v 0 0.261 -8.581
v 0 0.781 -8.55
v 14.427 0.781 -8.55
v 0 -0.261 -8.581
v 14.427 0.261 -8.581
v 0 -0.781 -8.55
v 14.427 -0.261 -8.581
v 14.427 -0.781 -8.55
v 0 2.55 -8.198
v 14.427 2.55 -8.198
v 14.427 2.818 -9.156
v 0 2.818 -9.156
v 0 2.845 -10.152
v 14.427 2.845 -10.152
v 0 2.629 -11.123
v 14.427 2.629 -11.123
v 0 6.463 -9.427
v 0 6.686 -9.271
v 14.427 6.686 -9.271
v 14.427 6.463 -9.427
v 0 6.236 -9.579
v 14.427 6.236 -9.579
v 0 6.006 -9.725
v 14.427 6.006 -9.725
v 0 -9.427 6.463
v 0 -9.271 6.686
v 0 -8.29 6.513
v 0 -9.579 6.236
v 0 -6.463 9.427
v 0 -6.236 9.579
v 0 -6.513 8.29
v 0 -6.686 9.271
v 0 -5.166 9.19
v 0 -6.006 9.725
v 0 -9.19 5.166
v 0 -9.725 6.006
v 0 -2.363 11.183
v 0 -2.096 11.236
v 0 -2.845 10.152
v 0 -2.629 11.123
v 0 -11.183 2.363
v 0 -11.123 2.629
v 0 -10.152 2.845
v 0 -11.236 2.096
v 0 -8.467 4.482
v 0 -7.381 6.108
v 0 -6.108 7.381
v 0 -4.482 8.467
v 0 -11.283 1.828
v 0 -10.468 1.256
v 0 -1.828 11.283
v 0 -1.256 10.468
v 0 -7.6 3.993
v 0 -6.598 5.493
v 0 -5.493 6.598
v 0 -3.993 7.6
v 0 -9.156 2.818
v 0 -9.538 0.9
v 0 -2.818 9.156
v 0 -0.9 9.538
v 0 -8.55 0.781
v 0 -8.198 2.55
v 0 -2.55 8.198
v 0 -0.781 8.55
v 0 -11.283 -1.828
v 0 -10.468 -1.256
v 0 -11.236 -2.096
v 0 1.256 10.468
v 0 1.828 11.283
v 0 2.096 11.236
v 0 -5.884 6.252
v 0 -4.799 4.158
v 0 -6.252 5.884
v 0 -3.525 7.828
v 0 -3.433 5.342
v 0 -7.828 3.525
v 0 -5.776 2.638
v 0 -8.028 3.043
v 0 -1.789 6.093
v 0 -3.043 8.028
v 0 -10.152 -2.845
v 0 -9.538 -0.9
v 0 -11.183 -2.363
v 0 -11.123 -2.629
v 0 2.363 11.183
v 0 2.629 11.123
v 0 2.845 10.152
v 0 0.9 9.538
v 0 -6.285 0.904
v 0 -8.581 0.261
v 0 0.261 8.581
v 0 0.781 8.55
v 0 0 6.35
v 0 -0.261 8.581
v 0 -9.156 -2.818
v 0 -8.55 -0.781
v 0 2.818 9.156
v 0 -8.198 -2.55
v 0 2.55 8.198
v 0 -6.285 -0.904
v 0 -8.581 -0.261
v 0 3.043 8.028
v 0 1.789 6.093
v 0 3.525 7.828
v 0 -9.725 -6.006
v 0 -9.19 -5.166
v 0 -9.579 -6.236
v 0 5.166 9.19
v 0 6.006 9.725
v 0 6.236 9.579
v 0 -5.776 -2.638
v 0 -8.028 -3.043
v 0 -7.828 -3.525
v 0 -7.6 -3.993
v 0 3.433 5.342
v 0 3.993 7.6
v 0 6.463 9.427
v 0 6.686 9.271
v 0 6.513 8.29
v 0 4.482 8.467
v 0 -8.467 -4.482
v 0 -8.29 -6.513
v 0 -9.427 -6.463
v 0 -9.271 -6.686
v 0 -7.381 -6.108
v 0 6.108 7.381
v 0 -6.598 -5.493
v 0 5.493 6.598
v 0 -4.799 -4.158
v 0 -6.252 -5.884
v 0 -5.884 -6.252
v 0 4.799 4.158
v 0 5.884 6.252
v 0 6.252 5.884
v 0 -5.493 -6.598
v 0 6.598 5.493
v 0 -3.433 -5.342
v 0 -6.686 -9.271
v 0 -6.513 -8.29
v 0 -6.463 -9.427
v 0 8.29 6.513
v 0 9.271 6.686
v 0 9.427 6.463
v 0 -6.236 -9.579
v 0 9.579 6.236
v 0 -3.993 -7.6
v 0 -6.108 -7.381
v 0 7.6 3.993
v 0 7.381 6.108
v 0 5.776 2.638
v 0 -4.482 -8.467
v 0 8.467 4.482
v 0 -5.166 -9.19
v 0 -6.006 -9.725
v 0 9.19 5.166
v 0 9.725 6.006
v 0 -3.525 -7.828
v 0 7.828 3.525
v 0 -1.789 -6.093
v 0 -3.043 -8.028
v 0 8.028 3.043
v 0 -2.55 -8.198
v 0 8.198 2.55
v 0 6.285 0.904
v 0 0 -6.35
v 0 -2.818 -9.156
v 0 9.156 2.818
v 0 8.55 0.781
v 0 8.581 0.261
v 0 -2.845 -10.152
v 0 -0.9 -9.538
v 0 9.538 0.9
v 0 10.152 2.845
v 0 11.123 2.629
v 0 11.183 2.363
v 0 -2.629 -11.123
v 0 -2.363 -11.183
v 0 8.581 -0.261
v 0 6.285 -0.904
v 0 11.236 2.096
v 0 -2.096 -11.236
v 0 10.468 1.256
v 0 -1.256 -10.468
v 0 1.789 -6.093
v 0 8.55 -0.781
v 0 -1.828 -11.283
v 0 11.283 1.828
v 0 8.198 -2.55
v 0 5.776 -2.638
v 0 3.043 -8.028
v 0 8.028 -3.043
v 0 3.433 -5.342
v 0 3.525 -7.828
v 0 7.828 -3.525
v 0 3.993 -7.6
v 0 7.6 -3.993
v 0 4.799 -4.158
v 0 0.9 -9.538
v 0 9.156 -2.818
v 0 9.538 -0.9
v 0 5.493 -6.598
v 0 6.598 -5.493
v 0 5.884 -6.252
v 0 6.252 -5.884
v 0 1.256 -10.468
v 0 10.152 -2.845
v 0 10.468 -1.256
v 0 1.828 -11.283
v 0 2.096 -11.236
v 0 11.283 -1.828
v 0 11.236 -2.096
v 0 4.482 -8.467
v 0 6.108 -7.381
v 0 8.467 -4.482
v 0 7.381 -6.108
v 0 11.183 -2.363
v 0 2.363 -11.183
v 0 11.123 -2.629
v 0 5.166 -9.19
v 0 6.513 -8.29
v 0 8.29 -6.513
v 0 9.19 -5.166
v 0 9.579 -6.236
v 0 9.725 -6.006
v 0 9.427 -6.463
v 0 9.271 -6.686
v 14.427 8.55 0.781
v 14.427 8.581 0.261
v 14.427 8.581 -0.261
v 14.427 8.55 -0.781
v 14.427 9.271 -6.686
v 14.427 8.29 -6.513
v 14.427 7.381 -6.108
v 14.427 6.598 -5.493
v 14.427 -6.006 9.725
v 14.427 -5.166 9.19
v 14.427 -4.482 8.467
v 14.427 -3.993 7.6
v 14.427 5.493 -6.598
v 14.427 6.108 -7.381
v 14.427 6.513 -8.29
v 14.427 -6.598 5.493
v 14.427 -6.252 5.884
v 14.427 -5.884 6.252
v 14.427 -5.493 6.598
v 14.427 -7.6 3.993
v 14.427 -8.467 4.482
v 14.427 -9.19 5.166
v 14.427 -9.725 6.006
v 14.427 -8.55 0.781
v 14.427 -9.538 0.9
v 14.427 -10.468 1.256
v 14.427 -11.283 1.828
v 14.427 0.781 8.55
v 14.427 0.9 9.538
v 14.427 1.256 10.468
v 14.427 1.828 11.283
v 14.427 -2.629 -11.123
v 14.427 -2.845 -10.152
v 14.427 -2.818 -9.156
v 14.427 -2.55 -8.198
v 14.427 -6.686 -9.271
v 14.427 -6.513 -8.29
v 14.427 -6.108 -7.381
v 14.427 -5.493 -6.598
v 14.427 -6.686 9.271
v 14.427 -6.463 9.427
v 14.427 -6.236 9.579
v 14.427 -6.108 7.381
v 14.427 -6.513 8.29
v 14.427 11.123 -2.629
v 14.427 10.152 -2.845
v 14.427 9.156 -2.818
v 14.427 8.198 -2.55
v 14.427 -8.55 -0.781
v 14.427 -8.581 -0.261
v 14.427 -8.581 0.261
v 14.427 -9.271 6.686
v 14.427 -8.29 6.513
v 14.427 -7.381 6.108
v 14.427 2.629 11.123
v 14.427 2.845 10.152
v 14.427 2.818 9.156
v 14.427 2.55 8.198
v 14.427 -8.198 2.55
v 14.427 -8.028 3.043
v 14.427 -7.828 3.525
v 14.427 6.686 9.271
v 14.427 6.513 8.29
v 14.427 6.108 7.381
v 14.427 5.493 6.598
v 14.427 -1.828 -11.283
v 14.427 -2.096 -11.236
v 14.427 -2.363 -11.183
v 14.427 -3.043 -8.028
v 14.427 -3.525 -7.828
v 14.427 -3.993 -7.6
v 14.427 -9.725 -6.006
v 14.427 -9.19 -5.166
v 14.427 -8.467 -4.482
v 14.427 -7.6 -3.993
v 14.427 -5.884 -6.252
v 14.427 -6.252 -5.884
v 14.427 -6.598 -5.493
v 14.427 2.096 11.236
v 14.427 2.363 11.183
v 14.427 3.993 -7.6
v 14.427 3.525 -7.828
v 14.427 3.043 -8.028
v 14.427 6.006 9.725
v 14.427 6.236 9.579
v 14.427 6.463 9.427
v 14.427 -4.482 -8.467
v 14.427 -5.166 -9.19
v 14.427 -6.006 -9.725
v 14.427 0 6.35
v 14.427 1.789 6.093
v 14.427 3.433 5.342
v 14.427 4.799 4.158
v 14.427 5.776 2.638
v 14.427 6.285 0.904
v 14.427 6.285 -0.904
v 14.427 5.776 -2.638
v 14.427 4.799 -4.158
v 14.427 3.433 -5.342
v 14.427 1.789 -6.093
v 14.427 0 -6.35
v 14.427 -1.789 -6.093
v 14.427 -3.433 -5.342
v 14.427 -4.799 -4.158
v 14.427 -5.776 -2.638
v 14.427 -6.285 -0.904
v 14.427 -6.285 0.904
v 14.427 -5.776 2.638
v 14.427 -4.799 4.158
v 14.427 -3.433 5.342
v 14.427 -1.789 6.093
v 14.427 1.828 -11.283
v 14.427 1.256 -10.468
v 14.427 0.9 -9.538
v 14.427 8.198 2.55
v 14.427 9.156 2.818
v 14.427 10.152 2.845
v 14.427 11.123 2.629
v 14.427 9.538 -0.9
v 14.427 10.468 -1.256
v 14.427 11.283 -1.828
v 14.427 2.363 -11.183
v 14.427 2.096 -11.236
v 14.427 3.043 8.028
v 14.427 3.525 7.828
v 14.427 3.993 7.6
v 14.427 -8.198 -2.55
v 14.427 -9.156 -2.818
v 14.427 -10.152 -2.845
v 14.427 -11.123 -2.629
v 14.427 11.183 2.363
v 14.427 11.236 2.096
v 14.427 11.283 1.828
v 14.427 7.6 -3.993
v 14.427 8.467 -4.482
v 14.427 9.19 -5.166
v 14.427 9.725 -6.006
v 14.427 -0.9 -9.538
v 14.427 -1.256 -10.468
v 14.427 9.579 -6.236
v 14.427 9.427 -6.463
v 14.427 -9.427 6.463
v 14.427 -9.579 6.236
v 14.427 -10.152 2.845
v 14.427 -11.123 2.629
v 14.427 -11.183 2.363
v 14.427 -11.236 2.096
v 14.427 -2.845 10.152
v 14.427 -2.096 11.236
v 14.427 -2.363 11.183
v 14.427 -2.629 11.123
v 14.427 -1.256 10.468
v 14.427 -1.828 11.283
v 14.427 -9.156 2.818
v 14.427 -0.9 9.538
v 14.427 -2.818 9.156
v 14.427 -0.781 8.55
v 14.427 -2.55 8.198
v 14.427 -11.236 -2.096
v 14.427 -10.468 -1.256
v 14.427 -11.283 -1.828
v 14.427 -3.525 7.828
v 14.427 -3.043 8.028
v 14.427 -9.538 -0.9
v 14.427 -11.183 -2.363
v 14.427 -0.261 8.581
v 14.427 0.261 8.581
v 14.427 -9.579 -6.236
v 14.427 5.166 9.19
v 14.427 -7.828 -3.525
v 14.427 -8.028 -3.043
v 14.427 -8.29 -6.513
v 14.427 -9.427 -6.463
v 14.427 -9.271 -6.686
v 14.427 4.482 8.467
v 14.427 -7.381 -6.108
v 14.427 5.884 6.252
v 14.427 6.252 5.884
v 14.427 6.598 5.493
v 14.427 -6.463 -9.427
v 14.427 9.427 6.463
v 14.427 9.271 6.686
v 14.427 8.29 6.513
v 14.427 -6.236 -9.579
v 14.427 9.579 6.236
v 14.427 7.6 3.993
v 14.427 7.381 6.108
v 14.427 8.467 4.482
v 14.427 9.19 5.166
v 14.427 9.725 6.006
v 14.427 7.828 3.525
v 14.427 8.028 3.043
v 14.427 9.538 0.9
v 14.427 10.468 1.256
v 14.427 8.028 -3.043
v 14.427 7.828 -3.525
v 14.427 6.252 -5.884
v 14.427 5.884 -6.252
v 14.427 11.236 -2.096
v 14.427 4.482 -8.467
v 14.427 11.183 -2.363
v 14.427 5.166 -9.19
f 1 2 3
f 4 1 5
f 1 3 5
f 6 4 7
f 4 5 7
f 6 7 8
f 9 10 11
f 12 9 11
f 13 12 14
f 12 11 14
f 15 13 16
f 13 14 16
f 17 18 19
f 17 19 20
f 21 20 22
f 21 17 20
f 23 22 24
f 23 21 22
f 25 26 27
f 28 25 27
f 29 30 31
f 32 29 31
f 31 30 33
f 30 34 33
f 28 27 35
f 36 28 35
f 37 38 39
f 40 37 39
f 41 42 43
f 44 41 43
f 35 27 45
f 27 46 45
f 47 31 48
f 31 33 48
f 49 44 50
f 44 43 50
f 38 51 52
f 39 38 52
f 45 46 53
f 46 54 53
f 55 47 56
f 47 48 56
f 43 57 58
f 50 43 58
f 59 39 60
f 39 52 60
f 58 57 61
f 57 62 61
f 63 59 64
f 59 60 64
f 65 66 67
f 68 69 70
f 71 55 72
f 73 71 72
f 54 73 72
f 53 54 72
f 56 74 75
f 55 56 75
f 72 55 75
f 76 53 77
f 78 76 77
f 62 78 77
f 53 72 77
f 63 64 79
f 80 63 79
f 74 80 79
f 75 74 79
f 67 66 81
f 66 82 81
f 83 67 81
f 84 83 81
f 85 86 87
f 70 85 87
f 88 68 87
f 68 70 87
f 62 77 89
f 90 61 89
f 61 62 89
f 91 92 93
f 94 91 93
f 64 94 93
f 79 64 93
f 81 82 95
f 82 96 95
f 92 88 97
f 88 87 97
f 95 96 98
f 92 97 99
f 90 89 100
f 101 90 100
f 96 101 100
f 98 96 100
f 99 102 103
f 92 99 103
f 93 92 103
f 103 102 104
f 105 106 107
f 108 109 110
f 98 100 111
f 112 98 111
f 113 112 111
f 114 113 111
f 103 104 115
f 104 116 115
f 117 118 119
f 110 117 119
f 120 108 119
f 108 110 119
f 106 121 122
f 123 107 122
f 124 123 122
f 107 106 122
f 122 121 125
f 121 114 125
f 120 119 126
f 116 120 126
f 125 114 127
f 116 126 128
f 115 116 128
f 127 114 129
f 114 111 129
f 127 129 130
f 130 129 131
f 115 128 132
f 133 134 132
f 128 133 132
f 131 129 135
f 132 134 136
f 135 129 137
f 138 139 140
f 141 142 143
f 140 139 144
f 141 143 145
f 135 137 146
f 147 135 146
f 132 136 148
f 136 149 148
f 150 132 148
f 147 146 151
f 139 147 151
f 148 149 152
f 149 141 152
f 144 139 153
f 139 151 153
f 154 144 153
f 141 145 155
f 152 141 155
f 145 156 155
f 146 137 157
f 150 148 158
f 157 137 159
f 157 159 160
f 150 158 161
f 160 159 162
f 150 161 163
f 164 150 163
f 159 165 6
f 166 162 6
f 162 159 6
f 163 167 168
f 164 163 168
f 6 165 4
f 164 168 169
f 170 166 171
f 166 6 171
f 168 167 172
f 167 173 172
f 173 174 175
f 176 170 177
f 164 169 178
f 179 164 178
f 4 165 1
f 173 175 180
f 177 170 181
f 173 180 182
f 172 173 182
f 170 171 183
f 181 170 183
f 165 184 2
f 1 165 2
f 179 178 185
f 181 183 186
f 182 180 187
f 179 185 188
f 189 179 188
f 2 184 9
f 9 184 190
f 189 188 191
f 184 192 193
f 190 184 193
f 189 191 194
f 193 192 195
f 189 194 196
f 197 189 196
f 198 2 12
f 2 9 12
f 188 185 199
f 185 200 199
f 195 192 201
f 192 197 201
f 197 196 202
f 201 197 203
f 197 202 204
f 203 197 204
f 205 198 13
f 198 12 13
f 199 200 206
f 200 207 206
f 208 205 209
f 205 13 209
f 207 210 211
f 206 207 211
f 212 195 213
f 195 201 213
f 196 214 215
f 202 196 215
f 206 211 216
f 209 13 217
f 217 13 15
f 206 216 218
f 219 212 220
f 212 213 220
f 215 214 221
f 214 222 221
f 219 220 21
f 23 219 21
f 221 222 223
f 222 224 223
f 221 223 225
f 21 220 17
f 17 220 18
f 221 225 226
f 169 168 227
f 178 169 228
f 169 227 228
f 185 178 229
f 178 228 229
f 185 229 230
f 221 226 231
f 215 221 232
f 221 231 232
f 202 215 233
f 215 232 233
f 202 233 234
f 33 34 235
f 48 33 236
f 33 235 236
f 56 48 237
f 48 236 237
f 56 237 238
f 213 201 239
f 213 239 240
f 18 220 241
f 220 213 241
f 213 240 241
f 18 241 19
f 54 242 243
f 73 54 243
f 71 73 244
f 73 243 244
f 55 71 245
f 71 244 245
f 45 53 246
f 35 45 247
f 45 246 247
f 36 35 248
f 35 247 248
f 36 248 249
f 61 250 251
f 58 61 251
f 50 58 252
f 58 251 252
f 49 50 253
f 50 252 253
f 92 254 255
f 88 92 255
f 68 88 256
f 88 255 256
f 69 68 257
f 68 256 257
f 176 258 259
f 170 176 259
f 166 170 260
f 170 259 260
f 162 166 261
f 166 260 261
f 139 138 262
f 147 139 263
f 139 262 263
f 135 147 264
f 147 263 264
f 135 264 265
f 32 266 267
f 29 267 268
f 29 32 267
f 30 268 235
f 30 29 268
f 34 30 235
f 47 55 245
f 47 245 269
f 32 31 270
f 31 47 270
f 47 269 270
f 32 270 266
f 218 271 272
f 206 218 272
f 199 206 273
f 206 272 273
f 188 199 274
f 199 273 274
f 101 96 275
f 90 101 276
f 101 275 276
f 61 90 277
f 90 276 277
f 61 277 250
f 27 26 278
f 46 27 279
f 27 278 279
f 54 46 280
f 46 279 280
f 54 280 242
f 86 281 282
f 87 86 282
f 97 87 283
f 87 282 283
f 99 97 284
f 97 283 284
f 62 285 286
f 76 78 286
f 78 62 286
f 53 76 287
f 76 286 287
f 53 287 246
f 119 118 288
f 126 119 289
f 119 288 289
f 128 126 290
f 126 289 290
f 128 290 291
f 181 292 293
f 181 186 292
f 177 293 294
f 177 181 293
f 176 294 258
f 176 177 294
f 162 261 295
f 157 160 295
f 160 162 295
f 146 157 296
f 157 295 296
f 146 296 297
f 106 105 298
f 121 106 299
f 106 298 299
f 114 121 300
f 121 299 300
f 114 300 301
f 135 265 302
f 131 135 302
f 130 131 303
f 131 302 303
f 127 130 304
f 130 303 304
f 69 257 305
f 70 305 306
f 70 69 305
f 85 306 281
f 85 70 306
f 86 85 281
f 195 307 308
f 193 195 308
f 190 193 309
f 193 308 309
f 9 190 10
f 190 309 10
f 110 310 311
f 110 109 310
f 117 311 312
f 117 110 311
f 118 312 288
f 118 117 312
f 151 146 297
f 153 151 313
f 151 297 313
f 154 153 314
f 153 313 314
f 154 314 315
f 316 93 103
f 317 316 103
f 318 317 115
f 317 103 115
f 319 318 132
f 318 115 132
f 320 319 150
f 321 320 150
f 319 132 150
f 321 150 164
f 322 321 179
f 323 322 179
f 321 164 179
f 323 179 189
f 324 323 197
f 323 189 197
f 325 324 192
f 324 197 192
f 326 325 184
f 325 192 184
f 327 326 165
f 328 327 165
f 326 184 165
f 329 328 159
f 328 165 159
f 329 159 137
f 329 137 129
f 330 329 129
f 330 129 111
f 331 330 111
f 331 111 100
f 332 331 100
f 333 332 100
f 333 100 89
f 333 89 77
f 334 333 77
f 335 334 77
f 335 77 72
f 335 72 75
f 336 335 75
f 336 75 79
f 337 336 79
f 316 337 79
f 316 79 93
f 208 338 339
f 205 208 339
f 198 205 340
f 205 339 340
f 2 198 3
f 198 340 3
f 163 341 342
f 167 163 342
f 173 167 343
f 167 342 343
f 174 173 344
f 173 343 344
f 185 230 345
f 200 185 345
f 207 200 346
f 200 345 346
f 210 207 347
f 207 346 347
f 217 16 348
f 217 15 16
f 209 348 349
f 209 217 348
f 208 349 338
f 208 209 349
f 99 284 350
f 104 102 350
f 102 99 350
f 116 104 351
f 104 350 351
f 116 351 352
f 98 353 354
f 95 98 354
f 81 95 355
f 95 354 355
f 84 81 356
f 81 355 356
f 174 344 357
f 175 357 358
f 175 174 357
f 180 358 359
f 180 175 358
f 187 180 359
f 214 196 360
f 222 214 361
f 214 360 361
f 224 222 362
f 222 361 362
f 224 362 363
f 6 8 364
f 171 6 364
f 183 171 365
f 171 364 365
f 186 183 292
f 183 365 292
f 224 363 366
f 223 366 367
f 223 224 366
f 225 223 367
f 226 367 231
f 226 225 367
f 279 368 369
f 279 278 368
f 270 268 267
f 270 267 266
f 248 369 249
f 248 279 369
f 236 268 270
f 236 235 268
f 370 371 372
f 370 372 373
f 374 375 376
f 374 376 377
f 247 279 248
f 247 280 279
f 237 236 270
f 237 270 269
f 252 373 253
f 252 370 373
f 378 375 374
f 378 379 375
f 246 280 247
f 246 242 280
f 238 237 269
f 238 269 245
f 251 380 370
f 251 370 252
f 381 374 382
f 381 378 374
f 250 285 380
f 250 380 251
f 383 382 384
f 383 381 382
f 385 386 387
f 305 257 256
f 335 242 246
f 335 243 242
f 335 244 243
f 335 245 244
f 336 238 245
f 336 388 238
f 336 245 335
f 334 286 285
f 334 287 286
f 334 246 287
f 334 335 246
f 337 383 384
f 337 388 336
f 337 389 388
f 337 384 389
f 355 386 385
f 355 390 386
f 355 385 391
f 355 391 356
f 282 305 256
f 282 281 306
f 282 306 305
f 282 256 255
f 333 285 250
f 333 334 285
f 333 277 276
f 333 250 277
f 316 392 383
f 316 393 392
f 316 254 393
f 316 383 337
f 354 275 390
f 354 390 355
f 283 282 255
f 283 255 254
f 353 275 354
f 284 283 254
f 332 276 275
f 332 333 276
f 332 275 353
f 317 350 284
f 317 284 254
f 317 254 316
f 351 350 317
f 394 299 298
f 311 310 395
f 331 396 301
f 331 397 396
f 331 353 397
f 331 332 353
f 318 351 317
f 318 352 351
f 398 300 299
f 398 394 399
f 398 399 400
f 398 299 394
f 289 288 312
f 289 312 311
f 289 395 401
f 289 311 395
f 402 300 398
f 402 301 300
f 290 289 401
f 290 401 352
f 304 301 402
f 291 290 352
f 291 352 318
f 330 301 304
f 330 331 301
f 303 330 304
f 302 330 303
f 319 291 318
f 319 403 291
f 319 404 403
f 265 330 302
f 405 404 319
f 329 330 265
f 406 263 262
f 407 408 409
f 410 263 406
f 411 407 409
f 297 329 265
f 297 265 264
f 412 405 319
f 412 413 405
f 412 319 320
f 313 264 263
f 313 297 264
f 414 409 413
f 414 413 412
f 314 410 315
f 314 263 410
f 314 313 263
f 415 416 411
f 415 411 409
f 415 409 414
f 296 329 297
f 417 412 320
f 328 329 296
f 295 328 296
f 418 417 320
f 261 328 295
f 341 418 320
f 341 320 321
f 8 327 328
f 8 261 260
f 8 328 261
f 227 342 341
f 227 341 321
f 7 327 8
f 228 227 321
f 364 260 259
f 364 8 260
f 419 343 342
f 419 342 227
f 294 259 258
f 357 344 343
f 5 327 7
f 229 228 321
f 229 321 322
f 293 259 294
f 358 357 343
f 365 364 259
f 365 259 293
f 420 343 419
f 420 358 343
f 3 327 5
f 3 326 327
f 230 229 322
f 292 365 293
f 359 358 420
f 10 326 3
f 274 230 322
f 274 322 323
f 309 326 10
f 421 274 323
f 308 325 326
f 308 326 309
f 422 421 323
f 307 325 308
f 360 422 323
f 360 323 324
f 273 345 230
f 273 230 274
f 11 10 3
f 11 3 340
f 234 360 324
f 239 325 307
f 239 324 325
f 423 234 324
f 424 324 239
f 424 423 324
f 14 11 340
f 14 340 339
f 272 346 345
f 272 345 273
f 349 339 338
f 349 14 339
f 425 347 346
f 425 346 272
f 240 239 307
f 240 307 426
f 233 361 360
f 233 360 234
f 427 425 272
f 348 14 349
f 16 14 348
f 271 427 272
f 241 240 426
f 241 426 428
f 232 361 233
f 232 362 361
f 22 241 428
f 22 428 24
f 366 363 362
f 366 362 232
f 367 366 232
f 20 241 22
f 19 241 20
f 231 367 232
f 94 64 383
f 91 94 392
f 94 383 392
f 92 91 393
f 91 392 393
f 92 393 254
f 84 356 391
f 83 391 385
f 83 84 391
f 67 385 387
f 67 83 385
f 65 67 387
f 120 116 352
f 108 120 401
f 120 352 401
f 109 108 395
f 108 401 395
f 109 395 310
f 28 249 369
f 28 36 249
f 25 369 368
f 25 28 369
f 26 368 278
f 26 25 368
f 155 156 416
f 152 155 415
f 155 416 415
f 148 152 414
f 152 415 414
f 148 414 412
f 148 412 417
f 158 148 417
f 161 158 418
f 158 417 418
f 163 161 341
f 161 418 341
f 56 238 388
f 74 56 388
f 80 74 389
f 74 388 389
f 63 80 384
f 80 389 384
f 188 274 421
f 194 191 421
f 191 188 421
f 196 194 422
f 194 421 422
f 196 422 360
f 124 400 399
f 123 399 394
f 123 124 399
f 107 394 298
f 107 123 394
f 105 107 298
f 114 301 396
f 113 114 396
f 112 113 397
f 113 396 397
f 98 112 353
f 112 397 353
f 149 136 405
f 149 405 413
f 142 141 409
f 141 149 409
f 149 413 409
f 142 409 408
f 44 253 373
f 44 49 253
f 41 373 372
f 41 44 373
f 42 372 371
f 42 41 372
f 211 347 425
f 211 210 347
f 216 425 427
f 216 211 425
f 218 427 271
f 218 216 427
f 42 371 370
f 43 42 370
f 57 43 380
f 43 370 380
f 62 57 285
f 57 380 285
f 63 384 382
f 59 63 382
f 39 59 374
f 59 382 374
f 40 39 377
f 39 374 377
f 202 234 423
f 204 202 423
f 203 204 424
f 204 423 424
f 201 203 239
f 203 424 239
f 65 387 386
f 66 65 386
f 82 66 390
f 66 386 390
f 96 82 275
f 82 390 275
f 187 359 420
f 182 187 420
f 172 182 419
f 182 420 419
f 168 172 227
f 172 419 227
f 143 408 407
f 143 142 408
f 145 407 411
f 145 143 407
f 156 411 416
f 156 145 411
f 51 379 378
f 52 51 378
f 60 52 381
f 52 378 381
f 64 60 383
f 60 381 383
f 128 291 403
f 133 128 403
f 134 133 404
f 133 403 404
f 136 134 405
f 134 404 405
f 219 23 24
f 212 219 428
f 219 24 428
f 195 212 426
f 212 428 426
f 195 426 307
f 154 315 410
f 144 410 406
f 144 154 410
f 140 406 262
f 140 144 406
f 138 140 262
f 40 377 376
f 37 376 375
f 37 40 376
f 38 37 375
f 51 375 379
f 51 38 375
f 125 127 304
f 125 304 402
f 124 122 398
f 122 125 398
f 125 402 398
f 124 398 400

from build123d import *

# Parameters (mm, degrees)
SKETCH1_W                   = 14.4272
SKETCH1_H                   = 11.43
CUT_EXTRUDE1_DEPTH          = 22.666423328
CUT_EXTRUDE2_DEPTH          = 22.666423328
CUT_EXTRUDE3_DEPTH          = 22.666423328
CUT_EXTRUDE4_DEPTH          = 22.666423328
CUT_EXTRUDE5_DEPTH          = 22.666423328
CUT_EXTRUDE6_DEPTH          = 22.666423328
CUT_EXTRUDE7_DEPTH          = 22.666423328
CUT_EXTRUDE8_DEPTH          = 22.666423328
CUT_EXTRUDE9_DEPTH          = 22.666423328
CUT_EXTRUDE10_DEPTH         = 22.666423328
CUT_EXTRUDE11_DEPTH         = 22.666423328
CUT_EXTRUDE12_DEPTH         = 22.589197779
CUT_EXTRUDE13_DEPTH         = 22.589197779
CUT_EXTRUDE14_DEPTH         = 22.589197779
CUT_EXTRUDE15_DEPTH         = 22.589197779
CUT_EXTRUDE16_DEPTH         = 22.511694997
F_1_4_0_25_DIAMETER_HOLE1_D = 12.7


with BuildPart() as part:
    # Sketch1 → Revolve1 (revolve)
    with BuildSketch(Plane(origin=(0, 0, 0), x_dir=(-1, 0, 0), z_dir=(0, 0, -1)), mode=Mode.PRIVATE) as revolve1_sk:
        with Locations((-7.2136, 5.715)):
            Rectangle(SKETCH1_W, SKETCH1_H)
    revolve(revolve1_sk.sketch.rotate(Axis((14.4272, 0, 0), (-1, 0, 0)), 270), axis=Axis((14.4272, 0, 0), (-1, 0, 0)))

    # Sketch2 → Cut-Extrude1 (cut, through all)
    with BuildSketch(Plane(origin=(14.4272, 0, 0), x_dir=(0, 0, -1), z_dir=(1, 0, 0))):
        with BuildLine():
            ThreePointArc((9.270604538, 6.685865052), (8.082230509, 8.082230509), (6.685865052, 9.270604538))
            ThreePointArc((6.685865052, 9.270604538), (6.338531077, 7.823071544), (5.493243318, 6.597722098))
            ThreePointArc((5.493243318, 6.597722098), (6.070653138, 6.070653138), (6.597722098, 5.493243318))
            ThreePointArc((6.597722098, 5.493243318), (7.823071544, 6.338531077), (9.270604538, 6.685865052))
        make_face()
    extrude(amount=-CUT_EXTRUDE1_DEPTH, mode=Mode.SUBTRACT)

    # Sketch3 → Cut-Extrude2 (cut, through all)
    with BuildSketch(Plane(origin=(14.4272, 0, 0), x_dir=(0, 0, -1), z_dir=(1, 0, 0))):
        with BuildLine():
            ThreePointArc((11.123491573, 2.629227114), (10.559943057, 4.374071632), (9.724640644, 6.006352))
            ThreePointArc((9.724640644, 6.006352), (8.849798999, 4.801924852), (7.599934007, 3.9933272))
            ThreePointArc((7.599934007, 3.9933272), (7.931690563, 3.285413804), (8.197673616, 2.550256131))
            ThreePointArc((8.197673616, 2.550256131), (9.65322651, 2.862279258), (11.123491573, 2.629227114))
        make_face()
    extrude(amount=-CUT_EXTRUDE2_DEPTH, mode=Mode.SUBTRACT)

    # Sketch4 → Cut-Extrude3 (cut, through all)
    with BuildSketch(Plane(origin=(14.4272, 0, 0), x_dir=(0, 0, -1), z_dir=(1, 0, 0))):
        with BuildLine():
            ThreePointArc((11.282927851, -1.827686818), (11.43, 0), (11.282927851, 1.827686818))
            ThreePointArc((11.282927851, 1.827686818), (10.013765246, 1.049728631), (8.549603637, 0.780984435))
            ThreePointArc((8.549603637, 0.780984435), (8.5852, 0), (8.549603637, -0.780984435))
            ThreePointArc((8.549603637, -0.780984435), (10.013765246, -1.049728631), (11.282927851, -1.827686818))
        make_face()
    extrude(amount=-CUT_EXTRUDE3_DEPTH, mode=Mode.SUBTRACT)

    # Sketch5 → Cut-Extrude4 (cut, through all)
    with BuildSketch(Plane(origin=(14.4272, 0, 0), x_dir=(0, 0, -1), z_dir=(1, 0, 0))):
        with BuildLine():
            ThreePointArc((9.724640644, -6.006352), (10.559943057, -4.374071632), (11.123491573, -2.629227114))
            ThreePointArc((11.123491573, -2.629227114), (9.65322651, -2.862279258), (8.197673616, -2.550256131))
            ThreePointArc((8.197673616, -2.550256131), (7.931690563, -3.285413804), (7.599934007, -3.9933272))
            ThreePointArc((7.599934007, -3.9933272), (8.849798999, -4.801924852), (9.724640644, -6.006352))
        make_face()
    extrude(amount=-CUT_EXTRUDE4_DEPTH, mode=Mode.SUBTRACT)

    # Sketch6 → Cut-Extrude5 (cut, through all)
    with BuildSketch(Plane(origin=(14.4272, 0, 0), x_dir=(0, 0, -1), z_dir=(1, 0, 0))):
        with BuildLine():
            ThreePointArc((6.685865052, -9.270604538), (8.082230509, -8.082230509), (9.270604538, -6.685865052))
            ThreePointArc((9.270604538, -6.685865052), (7.823071544, -6.338531077), (6.597722098, -5.493243318))
            ThreePointArc((6.597722098, -5.493243318), (6.070653138, -6.070653138), (5.493243318, -6.597722098))
            ThreePointArc((5.493243318, -6.597722098), (6.338531077, -7.823071544), (6.685865052, -9.270604538))
        make_face()
    extrude(amount=-CUT_EXTRUDE5_DEPTH, mode=Mode.SUBTRACT)

    # Sketch7 → Cut-Extrude6 (cut, through all)
    with BuildSketch(Plane(origin=(14.4272, 0, 0), x_dir=(0, 0, -1), z_dir=(1, 0, 0))):
        with BuildLine():
            ThreePointArc((2.629227114, -11.123491573), (4.374071632, -10.559943057), (6.006352, -9.724640644))
            ThreePointArc((6.006352, -9.724640644), (4.801924852, -8.849798999), (3.9933272, -7.599934007))
            ThreePointArc((3.9933272, -7.599934007), (3.285413804, -7.931690563), (2.550256131, -8.197673616))
            ThreePointArc((2.550256131, -8.197673616), (2.862279258, -9.65322651), (2.629227114, -11.123491573))
        make_face()
    extrude(amount=-CUT_EXTRUDE6_DEPTH, mode=Mode.SUBTRACT)

    # Sketch8 → Cut-Extrude7 (cut, through all)
    with BuildSketch(Plane(origin=(14.4272, 0, 0), x_dir=(0, 0, -1), z_dir=(1, 0, 0))):
        with BuildLine():
            ThreePointArc((-1.827686818, -11.282927851), (0, -11.43), (1.827686818, -11.282927851))
            ThreePointArc((1.827686818, -11.282927851), (1.049728631, -10.013765246), (0.780984435, -8.549603637))
            ThreePointArc((0.780984435, -8.549603637), (0, -8.5852), (-0.780984435, -8.549603637))
            ThreePointArc((-0.780984435, -8.549603637), (-1.049728631, -10.013765246), (-1.827686818, -11.282927851))
        make_face()
    extrude(amount=-CUT_EXTRUDE7_DEPTH, mode=Mode.SUBTRACT)

    # Sketch9 → Cut-Extrude8 (cut, through all)
    with BuildSketch(Plane(origin=(14.4272, 0, 0), x_dir=(0, 0, -1), z_dir=(1, 0, 0))):
        with BuildLine():
            ThreePointArc((-6.006352, -9.724640644), (-4.374071632, -10.559943057), (-2.629227114, -11.123491573))
            ThreePointArc((-2.629227114, -11.123491573), (-2.862279258, -9.65322651), (-2.550256131, -8.197673616))
            ThreePointArc((-2.550256131, -8.197673616), (-3.285413804, -7.931690563), (-3.9933272, -7.599934007))
            ThreePointArc((-3.9933272, -7.599934007), (-4.801924852, -8.849798999), (-6.006352, -9.724640644))
        make_face()
    extrude(amount=-CUT_EXTRUDE8_DEPTH, mode=Mode.SUBTRACT)

    # Sketch10 → Cut-Extrude9 (cut, through all)
    with BuildSketch(Plane(origin=(14.4272, 0, 0), x_dir=(0, 0, -1), z_dir=(1, 0, 0))):
        with BuildLine():
            ThreePointArc((-9.270604538, -6.685865052), (-8.082230509, -8.082230509), (-6.685865052, -9.270604538))
            ThreePointArc((-6.685865052, -9.270604538), (-6.338531077, -7.823071544), (-5.493243318, -6.597722098))
            ThreePointArc((-5.493243318, -6.597722098), (-6.070653138, -6.070653138), (-6.597722098, -5.493243318))
            ThreePointArc((-6.597722098, -5.493243318), (-7.823071544, -6.338531077), (-9.270604538, -6.685865052))
        make_face()
    extrude(amount=-CUT_EXTRUDE9_DEPTH, mode=Mode.SUBTRACT)

    # Sketch11 → Cut-Extrude10 (cut, through all)
    with BuildSketch(Plane(origin=(14.4272, 0, 0), x_dir=(0, 0, -1), z_dir=(1, 0, 0))):
        with BuildLine():
            ThreePointArc((-11.123491573, -2.629227114), (-10.559943057, -4.374071632), (-9.724640644, -6.006352))
            ThreePointArc((-9.724640644, -6.006352), (-8.849798999, -4.801924852), (-7.599934007, -3.9933272))
            ThreePointArc((-7.599934007, -3.9933272), (-7.931690563, -3.285413804), (-8.197673616, -2.550256131))
            ThreePointArc((-8.197673616, -2.550256131), (-9.65322651, -2.862279258), (-11.123491573, -2.629227114))
        make_face()
    extrude(amount=-CUT_EXTRUDE10_DEPTH, mode=Mode.SUBTRACT)

    # Sketch12 → Cut-Extrude11 (cut, through all)
    with BuildSketch(Plane(origin=(14.4272, 0, 0), x_dir=(0, 0, -1), z_dir=(1, 0, 0))):
        with BuildLine():
            ThreePointArc((-11.282927851, 1.827686818), (-11.43, 0), (-11.282927851, -1.827686818))
            ThreePointArc((-11.282927851, -1.827686818), (-10.013765246, -1.049728631), (-8.549603637, -0.780984435))
            ThreePointArc((-8.549603637, -0.780984435), (-8.5852, 0), (-8.549603637, 0.780984435))
            ThreePointArc((-8.549603637, 0.780984435), (-10.013765246, 1.049728631), (-11.282927851, 1.827686818))
        make_face()
    extrude(amount=-CUT_EXTRUDE11_DEPTH, mode=Mode.SUBTRACT)

    # Sketch13 → Cut-Extrude12 (cut, through all)
    with BuildSketch(Plane(origin=(14.4272, 0, 0), x_dir=(0, 0, -1), z_dir=(1, 0, 0))):
        with BuildLine():
            ThreePointArc((-9.724640644, 6.006352), (-10.559943057, 4.374071632), (-11.123491573, 2.629227114))
            ThreePointArc((-11.123491573, 2.629227114), (-9.65322651, 2.862279258), (-8.197673616, 2.550256131))
            ThreePointArc((-8.197673616, 2.550256131), (-7.931690563, 3.285413804), (-7.599934007, 3.9933272))
            ThreePointArc((-7.599934007, 3.9933272), (-8.849798999, 4.801924852), (-9.724640644, 6.006352))
        make_face()
    extrude(amount=-CUT_EXTRUDE12_DEPTH, mode=Mode.SUBTRACT)

    # Sketch14 → Cut-Extrude13 (cut, through all)
    with BuildSketch(Plane(origin=(14.4272, 0, 0), x_dir=(0, 0, -1), z_dir=(1, 0, 0))):
        with BuildLine():
            ThreePointArc((-6.685865052, 9.270604538), (-8.082230509, 8.082230509), (-9.270604538, 6.685865052))
            ThreePointArc((-9.270604538, 6.685865052), (-7.823071544, 6.338531077), (-6.597722098, 5.493243318))
            ThreePointArc((-6.597722098, 5.493243318), (-6.070653138, 6.070653138), (-5.493243318, 6.597722098))
            ThreePointArc((-5.493243318, 6.597722098), (-6.338531077, 7.823071544), (-6.685865052, 9.270604538))
        make_face()
    extrude(amount=-CUT_EXTRUDE13_DEPTH, mode=Mode.SUBTRACT)

    # Sketch15 → Cut-Extrude14 (cut, through all)
    with BuildSketch(Plane(origin=(14.4272, 0, 0), x_dir=(0, 0, -1), z_dir=(1, 0, 0))):
        with BuildLine():
            ThreePointArc((-2.629227114, 11.123491573), (-4.374071632, 10.559943057), (-6.006352, 9.724640644))
            ThreePointArc((-6.006352, 9.724640644), (-4.801924852, 8.849798999), (-3.9933272, 7.599934007))
            ThreePointArc((-3.9933272, 7.599934007), (-3.285413804, 7.931690563), (-2.550256131, 8.197673616))
            ThreePointArc((-2.550256131, 8.197673616), (-2.862279258, 9.65322651), (-2.629227114, 11.123491573))
        make_face()
    extrude(amount=-CUT_EXTRUDE14_DEPTH, mode=Mode.SUBTRACT)

    # Sketch16 → Cut-Extrude15 (cut, through all)
    with BuildSketch(Plane(origin=(14.4272, 0, 0), x_dir=(0, 0, -1), z_dir=(1, 0, 0))):
        with BuildLine():
            ThreePointArc((1.827686818, 11.282927851), (0, 11.43), (-1.827686818, 11.282927851))
            ThreePointArc((-1.827686818, 11.282927851), (-1.049728631, 10.013765246), (-0.780984435, 8.549603637))
            ThreePointArc((-0.780984435, 8.549603637), (0, 8.5852), (0.780984435, 8.549603637))
            ThreePointArc((0.780984435, 8.549603637), (1.049728631, 10.013765246), (1.827686818, 11.282927851))
        make_face()
    extrude(amount=-CUT_EXTRUDE15_DEPTH, mode=Mode.SUBTRACT)

    # Sketch17 → Cut-Extrude16 (cut, through all)
    with BuildSketch(Plane(origin=(14.4272, 0, 0), x_dir=(0, 0, -1), z_dir=(1, 0, 0))):
        with BuildLine():
            ThreePointArc((6.006352, 9.724640644), (4.374071632, 10.559943057), (2.629227114, 11.123491573))
            ThreePointArc((2.629227114, 11.123491573), (2.862279258, 9.65322651), (2.550256131, 8.197673616))
            ThreePointArc((2.550256131, 8.197673616), (3.285413804, 7.931690563), (3.9933272, 7.599934007))
            ThreePointArc((3.9933272, 7.599934007), (4.801924852, 8.849798999), (6.006352, 9.724640644))
        make_face()
    extrude(amount=-CUT_EXTRUDE16_DEPTH, mode=Mode.SUBTRACT)

    # 1/4 (0.25) Diameter Hole1 (through all)
    with Locations(Plane(origin=(14.4272, 0, 0), x_dir=(0, 0, -1), z_dir=(1, 0, 0))):
        with Locations((0, 0)):
            Hole(F_1_4_0_25_DIAMETER_HOLE1_D / 2)


solid = part.part
